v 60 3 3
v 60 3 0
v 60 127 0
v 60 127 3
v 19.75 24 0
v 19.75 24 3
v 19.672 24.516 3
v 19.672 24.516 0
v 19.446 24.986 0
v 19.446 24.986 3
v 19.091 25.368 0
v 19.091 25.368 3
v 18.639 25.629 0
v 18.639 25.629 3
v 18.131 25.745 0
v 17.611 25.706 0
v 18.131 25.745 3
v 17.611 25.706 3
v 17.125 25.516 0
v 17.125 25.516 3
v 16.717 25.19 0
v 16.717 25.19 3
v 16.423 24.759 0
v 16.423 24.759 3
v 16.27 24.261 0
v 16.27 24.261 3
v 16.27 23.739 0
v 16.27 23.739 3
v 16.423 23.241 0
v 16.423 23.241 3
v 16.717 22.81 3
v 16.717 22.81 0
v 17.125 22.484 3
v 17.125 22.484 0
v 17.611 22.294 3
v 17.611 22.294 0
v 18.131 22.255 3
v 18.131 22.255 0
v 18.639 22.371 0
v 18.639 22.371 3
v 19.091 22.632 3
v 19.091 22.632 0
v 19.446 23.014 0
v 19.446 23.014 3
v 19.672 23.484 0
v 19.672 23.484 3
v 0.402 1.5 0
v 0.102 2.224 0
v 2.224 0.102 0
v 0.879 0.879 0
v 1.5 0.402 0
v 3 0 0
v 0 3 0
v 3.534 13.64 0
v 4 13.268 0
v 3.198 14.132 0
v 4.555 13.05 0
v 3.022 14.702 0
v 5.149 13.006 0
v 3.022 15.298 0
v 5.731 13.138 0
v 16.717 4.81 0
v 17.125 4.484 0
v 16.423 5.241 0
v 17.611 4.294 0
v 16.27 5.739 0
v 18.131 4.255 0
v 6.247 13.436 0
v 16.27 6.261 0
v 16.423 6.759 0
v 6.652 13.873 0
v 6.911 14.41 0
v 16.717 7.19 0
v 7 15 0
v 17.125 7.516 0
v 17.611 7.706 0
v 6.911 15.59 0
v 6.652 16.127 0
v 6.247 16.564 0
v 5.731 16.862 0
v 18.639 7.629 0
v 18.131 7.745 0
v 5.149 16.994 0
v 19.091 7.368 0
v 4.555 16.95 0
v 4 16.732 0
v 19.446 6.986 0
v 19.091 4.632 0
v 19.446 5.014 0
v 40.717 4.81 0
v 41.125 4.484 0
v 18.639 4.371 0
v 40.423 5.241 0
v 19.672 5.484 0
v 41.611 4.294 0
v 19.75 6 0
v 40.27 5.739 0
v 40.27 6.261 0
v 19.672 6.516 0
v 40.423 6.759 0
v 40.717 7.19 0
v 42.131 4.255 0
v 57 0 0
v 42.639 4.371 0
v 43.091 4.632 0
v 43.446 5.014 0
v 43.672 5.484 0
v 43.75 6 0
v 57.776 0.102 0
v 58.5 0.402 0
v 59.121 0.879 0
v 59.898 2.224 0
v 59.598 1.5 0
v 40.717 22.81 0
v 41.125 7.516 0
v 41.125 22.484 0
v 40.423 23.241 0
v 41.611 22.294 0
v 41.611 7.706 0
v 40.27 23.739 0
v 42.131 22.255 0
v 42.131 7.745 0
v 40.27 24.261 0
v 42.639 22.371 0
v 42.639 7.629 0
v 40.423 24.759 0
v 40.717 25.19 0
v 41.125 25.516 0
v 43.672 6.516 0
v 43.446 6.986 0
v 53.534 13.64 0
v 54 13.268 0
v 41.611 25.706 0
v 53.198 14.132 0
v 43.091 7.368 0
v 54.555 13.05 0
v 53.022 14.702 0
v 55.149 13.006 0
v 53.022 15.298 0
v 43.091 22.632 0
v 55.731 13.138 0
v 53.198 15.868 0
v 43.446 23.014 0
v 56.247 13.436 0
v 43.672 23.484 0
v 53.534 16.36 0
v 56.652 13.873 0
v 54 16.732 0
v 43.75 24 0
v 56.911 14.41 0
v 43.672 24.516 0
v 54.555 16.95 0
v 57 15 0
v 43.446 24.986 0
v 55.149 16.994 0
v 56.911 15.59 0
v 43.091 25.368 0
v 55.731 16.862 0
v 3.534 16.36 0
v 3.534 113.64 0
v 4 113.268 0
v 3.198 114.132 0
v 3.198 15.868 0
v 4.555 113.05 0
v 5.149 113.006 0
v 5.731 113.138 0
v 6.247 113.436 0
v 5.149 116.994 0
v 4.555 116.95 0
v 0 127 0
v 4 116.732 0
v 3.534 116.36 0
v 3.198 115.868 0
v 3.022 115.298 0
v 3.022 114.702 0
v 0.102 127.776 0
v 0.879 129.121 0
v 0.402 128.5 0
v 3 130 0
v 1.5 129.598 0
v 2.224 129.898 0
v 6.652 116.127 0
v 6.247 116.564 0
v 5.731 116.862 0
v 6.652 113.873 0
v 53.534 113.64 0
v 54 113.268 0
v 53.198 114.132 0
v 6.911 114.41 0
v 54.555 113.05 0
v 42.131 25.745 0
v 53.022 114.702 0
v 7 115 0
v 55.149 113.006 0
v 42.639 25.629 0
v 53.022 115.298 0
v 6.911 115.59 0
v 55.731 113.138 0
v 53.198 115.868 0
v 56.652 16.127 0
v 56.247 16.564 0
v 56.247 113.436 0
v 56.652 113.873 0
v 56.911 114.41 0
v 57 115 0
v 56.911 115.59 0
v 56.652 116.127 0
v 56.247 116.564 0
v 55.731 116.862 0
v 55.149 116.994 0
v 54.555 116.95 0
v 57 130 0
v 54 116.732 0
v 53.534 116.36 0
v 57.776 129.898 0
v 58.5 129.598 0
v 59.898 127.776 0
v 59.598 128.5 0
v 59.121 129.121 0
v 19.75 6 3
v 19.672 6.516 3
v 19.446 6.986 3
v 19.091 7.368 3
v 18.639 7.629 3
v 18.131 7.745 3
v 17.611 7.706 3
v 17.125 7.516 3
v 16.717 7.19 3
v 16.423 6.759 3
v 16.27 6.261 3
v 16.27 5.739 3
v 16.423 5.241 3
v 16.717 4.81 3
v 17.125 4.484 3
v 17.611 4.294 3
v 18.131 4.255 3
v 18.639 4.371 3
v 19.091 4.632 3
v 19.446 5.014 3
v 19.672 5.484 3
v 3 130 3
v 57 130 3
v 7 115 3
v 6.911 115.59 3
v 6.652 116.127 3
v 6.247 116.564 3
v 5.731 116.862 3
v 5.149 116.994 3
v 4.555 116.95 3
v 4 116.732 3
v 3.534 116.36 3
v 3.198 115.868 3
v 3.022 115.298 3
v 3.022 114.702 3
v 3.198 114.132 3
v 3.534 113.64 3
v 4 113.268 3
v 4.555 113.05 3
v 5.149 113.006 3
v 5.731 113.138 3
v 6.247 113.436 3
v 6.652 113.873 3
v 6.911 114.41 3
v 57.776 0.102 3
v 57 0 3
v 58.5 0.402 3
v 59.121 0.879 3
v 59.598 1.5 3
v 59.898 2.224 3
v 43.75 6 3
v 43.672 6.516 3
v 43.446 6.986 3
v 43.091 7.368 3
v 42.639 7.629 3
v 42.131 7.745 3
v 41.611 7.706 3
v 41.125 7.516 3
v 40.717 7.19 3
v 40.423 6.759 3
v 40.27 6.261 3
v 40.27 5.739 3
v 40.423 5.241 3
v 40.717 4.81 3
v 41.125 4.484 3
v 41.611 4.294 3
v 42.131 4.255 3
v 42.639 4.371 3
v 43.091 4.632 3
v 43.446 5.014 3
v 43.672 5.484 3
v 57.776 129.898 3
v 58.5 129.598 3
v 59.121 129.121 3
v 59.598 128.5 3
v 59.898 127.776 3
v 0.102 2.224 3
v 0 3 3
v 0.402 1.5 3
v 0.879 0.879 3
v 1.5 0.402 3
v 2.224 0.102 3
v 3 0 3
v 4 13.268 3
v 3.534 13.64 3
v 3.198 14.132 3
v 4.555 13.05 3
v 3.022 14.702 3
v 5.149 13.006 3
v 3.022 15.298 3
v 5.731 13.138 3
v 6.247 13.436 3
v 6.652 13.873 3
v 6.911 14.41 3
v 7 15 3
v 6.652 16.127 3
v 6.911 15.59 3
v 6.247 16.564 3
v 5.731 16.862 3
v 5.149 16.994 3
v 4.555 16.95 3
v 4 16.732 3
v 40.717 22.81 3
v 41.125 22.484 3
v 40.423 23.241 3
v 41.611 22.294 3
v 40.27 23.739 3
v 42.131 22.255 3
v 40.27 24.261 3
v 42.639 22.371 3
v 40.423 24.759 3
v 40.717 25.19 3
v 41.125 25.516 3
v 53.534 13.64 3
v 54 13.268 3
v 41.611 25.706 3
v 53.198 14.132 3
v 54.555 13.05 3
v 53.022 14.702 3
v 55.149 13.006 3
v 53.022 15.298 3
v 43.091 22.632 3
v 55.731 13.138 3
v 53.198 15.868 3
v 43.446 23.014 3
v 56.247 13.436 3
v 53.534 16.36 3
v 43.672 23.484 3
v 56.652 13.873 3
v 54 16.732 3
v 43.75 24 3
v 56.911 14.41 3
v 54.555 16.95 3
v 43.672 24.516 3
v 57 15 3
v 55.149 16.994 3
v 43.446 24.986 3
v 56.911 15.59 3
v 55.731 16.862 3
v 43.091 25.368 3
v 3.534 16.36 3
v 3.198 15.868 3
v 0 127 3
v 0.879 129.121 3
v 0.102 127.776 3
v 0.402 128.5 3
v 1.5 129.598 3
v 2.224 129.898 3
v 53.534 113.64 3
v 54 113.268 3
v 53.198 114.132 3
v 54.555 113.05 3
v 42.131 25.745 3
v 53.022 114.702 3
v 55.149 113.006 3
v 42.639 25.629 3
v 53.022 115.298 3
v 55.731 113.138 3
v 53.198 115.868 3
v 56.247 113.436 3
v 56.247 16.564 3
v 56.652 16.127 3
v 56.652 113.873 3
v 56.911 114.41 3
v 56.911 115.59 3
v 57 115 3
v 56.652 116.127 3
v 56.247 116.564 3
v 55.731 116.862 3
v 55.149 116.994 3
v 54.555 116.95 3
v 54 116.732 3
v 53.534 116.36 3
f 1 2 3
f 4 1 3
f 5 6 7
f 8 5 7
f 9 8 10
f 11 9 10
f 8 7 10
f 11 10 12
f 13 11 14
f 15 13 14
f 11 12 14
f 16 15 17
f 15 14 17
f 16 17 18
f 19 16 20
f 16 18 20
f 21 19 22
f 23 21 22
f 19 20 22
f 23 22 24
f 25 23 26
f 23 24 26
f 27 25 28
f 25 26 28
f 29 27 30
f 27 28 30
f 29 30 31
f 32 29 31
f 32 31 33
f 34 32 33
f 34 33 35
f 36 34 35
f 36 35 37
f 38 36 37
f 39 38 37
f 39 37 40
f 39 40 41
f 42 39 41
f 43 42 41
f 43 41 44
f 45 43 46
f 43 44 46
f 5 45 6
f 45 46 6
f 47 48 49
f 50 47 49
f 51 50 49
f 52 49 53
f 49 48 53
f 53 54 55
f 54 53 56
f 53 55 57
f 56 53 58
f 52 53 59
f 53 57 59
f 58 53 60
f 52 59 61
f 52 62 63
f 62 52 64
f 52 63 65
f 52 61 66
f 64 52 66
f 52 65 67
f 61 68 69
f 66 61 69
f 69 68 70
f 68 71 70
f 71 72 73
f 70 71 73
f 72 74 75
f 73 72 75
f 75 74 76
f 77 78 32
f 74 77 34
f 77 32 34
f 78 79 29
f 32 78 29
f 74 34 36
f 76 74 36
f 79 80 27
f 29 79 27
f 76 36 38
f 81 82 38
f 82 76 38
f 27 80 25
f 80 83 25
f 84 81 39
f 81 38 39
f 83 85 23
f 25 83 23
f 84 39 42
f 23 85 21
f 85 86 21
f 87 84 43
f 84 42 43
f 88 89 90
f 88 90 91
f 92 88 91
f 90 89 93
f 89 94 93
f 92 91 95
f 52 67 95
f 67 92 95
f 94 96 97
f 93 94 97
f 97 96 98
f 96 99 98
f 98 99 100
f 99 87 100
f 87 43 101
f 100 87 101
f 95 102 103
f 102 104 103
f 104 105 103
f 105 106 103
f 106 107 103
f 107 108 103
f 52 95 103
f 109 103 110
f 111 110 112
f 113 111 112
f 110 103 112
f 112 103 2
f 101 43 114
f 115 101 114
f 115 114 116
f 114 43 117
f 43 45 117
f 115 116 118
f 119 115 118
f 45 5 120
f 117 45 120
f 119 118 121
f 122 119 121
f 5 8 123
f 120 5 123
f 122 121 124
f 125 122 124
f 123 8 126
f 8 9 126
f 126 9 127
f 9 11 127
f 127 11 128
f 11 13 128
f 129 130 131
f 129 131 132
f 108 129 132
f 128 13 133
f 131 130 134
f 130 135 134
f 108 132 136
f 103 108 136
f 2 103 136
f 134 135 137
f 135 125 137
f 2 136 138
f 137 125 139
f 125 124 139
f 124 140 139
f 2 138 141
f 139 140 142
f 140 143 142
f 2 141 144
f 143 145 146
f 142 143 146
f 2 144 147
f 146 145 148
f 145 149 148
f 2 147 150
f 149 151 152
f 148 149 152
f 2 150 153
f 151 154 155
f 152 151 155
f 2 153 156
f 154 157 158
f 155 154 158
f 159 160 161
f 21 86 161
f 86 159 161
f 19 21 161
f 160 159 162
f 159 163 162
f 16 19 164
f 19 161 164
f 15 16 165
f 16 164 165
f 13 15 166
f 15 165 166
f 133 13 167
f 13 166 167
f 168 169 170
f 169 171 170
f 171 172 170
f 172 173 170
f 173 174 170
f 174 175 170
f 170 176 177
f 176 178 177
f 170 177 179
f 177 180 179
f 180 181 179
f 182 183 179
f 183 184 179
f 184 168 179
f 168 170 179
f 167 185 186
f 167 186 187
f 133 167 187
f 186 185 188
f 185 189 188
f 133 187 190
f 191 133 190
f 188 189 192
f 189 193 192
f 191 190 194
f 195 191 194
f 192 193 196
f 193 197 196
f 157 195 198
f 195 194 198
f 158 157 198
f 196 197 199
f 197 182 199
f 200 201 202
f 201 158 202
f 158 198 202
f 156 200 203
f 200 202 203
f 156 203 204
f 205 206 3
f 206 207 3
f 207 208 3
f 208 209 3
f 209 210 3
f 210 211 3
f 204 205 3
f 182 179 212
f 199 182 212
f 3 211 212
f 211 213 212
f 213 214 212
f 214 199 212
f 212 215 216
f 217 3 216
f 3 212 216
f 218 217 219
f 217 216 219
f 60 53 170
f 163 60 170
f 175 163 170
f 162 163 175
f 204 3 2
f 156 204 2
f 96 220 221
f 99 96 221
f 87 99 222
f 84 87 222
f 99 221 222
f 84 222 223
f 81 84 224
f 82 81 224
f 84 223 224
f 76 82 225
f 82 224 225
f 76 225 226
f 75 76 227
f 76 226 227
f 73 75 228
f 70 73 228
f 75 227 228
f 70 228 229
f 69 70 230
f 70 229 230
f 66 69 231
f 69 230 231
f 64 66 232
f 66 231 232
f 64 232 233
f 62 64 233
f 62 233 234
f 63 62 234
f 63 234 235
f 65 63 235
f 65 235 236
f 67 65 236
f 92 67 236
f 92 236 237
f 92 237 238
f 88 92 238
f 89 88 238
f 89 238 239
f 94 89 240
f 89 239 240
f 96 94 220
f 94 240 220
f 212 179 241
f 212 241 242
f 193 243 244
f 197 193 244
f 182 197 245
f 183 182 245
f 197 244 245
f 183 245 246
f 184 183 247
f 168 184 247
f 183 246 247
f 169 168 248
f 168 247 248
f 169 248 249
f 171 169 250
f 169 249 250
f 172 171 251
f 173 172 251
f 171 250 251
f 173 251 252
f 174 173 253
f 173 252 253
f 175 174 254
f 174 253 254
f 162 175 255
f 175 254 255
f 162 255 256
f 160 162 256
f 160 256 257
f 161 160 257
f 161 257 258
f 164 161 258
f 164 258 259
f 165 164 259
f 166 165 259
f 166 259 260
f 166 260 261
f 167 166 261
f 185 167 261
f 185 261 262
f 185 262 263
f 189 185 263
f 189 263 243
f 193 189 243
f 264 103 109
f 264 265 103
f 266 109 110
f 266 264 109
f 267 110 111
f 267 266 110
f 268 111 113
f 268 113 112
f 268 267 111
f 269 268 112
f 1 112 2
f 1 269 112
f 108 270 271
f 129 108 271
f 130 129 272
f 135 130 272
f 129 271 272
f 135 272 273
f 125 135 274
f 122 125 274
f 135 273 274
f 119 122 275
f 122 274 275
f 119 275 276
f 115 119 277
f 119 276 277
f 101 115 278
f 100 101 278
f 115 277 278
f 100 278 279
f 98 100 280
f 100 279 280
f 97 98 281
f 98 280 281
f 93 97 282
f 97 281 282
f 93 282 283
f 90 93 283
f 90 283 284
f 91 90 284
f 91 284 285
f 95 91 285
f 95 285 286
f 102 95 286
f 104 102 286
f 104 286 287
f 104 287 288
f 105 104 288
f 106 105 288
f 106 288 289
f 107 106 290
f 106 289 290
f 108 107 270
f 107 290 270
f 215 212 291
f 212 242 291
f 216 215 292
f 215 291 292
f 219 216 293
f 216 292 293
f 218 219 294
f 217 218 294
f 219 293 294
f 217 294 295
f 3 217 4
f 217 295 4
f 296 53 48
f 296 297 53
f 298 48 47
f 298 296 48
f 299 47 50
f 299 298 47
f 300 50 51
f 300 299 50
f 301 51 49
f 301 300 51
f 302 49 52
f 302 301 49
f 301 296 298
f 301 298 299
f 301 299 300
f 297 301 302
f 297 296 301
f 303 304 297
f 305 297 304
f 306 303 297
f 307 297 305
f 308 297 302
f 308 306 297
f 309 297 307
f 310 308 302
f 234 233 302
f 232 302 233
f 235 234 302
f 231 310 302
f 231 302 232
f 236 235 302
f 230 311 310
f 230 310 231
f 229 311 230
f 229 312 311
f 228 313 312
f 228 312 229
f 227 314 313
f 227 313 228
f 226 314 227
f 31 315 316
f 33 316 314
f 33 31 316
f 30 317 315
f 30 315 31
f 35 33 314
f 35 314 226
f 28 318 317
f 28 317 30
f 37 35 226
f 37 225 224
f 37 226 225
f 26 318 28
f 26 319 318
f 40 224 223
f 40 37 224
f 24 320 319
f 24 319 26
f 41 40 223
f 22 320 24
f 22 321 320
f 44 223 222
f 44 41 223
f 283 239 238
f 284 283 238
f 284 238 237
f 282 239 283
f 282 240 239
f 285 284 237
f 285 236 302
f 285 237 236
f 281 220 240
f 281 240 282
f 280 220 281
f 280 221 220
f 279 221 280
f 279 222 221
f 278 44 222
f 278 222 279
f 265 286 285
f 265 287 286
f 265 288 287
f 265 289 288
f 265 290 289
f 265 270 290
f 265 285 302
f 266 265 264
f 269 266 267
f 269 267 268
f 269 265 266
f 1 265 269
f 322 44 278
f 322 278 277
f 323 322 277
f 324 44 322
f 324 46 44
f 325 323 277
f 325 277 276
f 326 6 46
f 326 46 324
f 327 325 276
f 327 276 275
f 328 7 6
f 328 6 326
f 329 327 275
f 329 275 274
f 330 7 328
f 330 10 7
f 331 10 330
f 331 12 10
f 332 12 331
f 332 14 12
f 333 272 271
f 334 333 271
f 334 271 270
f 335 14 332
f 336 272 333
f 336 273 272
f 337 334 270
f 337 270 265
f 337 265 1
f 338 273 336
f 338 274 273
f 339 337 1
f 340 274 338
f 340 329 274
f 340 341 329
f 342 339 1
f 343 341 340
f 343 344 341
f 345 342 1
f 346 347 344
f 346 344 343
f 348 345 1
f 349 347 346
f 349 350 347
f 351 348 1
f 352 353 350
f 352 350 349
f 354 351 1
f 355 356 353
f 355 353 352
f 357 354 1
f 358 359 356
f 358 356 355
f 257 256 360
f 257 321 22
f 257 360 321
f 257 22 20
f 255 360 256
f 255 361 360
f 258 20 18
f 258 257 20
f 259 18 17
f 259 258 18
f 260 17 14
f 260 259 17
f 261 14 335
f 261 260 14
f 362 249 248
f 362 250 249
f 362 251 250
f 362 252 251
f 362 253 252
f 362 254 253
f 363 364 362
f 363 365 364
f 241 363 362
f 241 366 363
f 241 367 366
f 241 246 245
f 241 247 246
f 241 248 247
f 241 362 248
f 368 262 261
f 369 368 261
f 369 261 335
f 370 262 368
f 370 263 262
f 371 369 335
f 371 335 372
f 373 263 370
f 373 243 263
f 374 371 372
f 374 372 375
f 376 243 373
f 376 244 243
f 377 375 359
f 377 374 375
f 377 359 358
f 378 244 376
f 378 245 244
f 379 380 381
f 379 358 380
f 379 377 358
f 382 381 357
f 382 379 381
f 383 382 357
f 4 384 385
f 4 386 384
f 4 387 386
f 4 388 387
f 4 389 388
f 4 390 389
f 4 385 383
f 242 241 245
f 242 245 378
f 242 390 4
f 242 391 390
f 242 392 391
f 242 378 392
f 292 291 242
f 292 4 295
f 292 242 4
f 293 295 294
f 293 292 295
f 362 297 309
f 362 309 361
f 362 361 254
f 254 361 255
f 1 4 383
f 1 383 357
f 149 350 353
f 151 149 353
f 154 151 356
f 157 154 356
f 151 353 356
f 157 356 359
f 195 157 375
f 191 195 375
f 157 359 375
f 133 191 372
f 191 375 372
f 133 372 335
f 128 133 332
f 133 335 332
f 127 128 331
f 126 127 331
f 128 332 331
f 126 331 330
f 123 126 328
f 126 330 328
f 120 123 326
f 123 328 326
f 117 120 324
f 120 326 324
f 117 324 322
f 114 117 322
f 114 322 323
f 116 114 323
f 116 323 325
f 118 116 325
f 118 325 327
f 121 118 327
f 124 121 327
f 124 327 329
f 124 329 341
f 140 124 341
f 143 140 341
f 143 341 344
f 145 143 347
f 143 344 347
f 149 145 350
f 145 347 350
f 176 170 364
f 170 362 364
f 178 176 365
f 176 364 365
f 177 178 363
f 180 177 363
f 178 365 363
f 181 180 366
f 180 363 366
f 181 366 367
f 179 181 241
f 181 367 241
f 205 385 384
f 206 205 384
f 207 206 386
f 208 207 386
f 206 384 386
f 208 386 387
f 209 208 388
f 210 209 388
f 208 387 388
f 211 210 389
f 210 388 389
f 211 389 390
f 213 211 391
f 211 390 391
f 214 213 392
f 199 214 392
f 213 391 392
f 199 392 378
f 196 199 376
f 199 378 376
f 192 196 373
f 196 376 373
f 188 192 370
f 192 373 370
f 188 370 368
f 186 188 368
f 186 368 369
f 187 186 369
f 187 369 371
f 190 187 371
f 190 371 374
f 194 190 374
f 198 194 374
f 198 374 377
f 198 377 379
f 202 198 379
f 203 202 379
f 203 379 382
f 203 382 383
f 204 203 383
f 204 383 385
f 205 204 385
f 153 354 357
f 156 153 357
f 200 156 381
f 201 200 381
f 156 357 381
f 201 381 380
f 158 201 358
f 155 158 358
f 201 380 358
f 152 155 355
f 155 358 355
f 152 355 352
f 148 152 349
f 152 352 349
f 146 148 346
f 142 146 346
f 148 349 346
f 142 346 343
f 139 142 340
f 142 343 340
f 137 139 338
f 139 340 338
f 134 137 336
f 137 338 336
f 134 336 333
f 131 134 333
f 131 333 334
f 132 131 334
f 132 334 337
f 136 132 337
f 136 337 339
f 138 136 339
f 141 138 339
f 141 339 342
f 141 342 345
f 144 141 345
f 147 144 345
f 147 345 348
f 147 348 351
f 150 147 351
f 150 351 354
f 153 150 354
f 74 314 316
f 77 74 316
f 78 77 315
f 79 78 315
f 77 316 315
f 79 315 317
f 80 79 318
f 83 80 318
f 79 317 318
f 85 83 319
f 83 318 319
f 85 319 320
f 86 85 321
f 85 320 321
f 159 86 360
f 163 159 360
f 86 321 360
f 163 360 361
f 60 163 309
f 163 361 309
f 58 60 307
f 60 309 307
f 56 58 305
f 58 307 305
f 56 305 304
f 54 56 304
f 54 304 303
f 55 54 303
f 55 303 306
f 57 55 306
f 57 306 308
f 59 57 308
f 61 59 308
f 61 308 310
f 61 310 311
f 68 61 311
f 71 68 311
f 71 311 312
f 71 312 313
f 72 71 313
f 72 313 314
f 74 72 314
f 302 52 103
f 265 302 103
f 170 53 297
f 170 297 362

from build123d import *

# Parameters (mm, degrees)
SZKIC1_W                    = 60
SZKIC1_H                    = 130
DODANIE_WYCI_GNI_CIE1_DEPTH = 3
WYTNIJ_WYCI_GNI_CIE1_REACH  = 145.21
SZKIC2_R                    = 2
ZAOKR_GLENIE1_R             = 3
SZKIC3_R                    = 1.75
WYTNIJ_WYCI_GNI_CIE2_DEPTH  = 3


with BuildPart() as part:
    # Szkic1 → Dodanie-wyciągnięcie1 (new body)
    with BuildSketch(Plane.XY):
        with Locations((30, 65)):
            Rectangle(SZKIC1_W, SZKIC1_H)
    extrude(amount=DODANIE_WYCI_GNI_CIE1_DEPTH)

    # Szkic2 → Wytnij-wyciągnięcie1 (cut, up to next)
    with BuildSketch(Plane.XY.offset(3), mode=Mode.PRIVATE) as wytnij_wyci_gni_cie1_sk1:
        with Locations((5, 115)):
            Circle(SZKIC2_R)
    wytnij_wyci_gni_cie1_tool1 = extrude(wytnij_wyci_gni_cie1_sk1.sketch, amount=-WYTNIJ_WYCI_GNI_CIE1_REACH, mode=Mode.PRIVATE) & part.part
    # Szkic2 → Wytnij-wyciągnięcie1 (cut, up to next)
    with BuildSketch(Plane.XY.offset(3), mode=Mode.PRIVATE) as wytnij_wyci_gni_cie1_sk2:
        with Locations((55, 115)):
            Circle(SZKIC2_R)
    wytnij_wyci_gni_cie1_tool2 = extrude(wytnij_wyci_gni_cie1_sk2.sketch, amount=-WYTNIJ_WYCI_GNI_CIE1_REACH, mode=Mode.PRIVATE) & part.part
    # Szkic2 → Wytnij-wyciągnięcie1 (cut, up to next)
    with BuildSketch(Plane.XY.offset(3), mode=Mode.PRIVATE) as wytnij_wyci_gni_cie1_sk3:
        with Locations((5, 15)):
            Circle(SZKIC2_R)
    wytnij_wyci_gni_cie1_tool3 = extrude(wytnij_wyci_gni_cie1_sk3.sketch, amount=-WYTNIJ_WYCI_GNI_CIE1_REACH, mode=Mode.PRIVATE) & part.part
    # Szkic2 → Wytnij-wyciągnięcie1 (cut, up to next)
    with BuildSketch(Plane.XY.offset(3), mode=Mode.PRIVATE) as wytnij_wyci_gni_cie1_sk4:
        with Locations((55, 15)):
            Circle(SZKIC2_R)
    wytnij_wyci_gni_cie1_tool4 = extrude(wytnij_wyci_gni_cie1_sk4.sketch, amount=-WYTNIJ_WYCI_GNI_CIE1_REACH, mode=Mode.PRIVATE) & part.part
    add(wytnij_wyci_gni_cie1_tool1.solids().sort_by_distance((5, 115, 3))[0], mode=Mode.SUBTRACT)
    add(wytnij_wyci_gni_cie1_tool2.solids().sort_by_distance((55, 115, 3))[0], mode=Mode.SUBTRACT)
    add(wytnij_wyci_gni_cie1_tool3.solids().sort_by_distance((5, 15, 3))[0], mode=Mode.SUBTRACT)
    add(wytnij_wyci_gni_cie1_tool4.solids().sort_by_distance((55, 15, 3))[0], mode=Mode.SUBTRACT)

    # Zaokrąglenie1
    zaokr_glenie1_edges = [part.edges().sort_by_distance(p)[0] for p in [
        (0, 130, 1.5),
        (60, 130, 1.5),
        (60, 0, 1.5),
        (0, 0, 1.5),
    ]]
    fillet(zaokr_glenie1_edges, radius=ZAOKR_GLENIE1_R)

    # Szkic3 → Wytnij-wyciągnięcie2 (cut)
    with BuildSketch(Plane.XY.offset(3)):
        with Locations((18, 24)):
            Circle(SZKIC3_R)
        with Locations((42, 24)):
            Circle(SZKIC3_R)
        with Locations((42, 6)):
            Circle(SZKIC3_R)
        with Locations((18, 6)):
            Circle(SZKIC3_R)
    extrude(amount=-WYTNIJ_WYCI_GNI_CIE2_DEPTH, mode=Mode.SUBTRACT)


solid = part.part
